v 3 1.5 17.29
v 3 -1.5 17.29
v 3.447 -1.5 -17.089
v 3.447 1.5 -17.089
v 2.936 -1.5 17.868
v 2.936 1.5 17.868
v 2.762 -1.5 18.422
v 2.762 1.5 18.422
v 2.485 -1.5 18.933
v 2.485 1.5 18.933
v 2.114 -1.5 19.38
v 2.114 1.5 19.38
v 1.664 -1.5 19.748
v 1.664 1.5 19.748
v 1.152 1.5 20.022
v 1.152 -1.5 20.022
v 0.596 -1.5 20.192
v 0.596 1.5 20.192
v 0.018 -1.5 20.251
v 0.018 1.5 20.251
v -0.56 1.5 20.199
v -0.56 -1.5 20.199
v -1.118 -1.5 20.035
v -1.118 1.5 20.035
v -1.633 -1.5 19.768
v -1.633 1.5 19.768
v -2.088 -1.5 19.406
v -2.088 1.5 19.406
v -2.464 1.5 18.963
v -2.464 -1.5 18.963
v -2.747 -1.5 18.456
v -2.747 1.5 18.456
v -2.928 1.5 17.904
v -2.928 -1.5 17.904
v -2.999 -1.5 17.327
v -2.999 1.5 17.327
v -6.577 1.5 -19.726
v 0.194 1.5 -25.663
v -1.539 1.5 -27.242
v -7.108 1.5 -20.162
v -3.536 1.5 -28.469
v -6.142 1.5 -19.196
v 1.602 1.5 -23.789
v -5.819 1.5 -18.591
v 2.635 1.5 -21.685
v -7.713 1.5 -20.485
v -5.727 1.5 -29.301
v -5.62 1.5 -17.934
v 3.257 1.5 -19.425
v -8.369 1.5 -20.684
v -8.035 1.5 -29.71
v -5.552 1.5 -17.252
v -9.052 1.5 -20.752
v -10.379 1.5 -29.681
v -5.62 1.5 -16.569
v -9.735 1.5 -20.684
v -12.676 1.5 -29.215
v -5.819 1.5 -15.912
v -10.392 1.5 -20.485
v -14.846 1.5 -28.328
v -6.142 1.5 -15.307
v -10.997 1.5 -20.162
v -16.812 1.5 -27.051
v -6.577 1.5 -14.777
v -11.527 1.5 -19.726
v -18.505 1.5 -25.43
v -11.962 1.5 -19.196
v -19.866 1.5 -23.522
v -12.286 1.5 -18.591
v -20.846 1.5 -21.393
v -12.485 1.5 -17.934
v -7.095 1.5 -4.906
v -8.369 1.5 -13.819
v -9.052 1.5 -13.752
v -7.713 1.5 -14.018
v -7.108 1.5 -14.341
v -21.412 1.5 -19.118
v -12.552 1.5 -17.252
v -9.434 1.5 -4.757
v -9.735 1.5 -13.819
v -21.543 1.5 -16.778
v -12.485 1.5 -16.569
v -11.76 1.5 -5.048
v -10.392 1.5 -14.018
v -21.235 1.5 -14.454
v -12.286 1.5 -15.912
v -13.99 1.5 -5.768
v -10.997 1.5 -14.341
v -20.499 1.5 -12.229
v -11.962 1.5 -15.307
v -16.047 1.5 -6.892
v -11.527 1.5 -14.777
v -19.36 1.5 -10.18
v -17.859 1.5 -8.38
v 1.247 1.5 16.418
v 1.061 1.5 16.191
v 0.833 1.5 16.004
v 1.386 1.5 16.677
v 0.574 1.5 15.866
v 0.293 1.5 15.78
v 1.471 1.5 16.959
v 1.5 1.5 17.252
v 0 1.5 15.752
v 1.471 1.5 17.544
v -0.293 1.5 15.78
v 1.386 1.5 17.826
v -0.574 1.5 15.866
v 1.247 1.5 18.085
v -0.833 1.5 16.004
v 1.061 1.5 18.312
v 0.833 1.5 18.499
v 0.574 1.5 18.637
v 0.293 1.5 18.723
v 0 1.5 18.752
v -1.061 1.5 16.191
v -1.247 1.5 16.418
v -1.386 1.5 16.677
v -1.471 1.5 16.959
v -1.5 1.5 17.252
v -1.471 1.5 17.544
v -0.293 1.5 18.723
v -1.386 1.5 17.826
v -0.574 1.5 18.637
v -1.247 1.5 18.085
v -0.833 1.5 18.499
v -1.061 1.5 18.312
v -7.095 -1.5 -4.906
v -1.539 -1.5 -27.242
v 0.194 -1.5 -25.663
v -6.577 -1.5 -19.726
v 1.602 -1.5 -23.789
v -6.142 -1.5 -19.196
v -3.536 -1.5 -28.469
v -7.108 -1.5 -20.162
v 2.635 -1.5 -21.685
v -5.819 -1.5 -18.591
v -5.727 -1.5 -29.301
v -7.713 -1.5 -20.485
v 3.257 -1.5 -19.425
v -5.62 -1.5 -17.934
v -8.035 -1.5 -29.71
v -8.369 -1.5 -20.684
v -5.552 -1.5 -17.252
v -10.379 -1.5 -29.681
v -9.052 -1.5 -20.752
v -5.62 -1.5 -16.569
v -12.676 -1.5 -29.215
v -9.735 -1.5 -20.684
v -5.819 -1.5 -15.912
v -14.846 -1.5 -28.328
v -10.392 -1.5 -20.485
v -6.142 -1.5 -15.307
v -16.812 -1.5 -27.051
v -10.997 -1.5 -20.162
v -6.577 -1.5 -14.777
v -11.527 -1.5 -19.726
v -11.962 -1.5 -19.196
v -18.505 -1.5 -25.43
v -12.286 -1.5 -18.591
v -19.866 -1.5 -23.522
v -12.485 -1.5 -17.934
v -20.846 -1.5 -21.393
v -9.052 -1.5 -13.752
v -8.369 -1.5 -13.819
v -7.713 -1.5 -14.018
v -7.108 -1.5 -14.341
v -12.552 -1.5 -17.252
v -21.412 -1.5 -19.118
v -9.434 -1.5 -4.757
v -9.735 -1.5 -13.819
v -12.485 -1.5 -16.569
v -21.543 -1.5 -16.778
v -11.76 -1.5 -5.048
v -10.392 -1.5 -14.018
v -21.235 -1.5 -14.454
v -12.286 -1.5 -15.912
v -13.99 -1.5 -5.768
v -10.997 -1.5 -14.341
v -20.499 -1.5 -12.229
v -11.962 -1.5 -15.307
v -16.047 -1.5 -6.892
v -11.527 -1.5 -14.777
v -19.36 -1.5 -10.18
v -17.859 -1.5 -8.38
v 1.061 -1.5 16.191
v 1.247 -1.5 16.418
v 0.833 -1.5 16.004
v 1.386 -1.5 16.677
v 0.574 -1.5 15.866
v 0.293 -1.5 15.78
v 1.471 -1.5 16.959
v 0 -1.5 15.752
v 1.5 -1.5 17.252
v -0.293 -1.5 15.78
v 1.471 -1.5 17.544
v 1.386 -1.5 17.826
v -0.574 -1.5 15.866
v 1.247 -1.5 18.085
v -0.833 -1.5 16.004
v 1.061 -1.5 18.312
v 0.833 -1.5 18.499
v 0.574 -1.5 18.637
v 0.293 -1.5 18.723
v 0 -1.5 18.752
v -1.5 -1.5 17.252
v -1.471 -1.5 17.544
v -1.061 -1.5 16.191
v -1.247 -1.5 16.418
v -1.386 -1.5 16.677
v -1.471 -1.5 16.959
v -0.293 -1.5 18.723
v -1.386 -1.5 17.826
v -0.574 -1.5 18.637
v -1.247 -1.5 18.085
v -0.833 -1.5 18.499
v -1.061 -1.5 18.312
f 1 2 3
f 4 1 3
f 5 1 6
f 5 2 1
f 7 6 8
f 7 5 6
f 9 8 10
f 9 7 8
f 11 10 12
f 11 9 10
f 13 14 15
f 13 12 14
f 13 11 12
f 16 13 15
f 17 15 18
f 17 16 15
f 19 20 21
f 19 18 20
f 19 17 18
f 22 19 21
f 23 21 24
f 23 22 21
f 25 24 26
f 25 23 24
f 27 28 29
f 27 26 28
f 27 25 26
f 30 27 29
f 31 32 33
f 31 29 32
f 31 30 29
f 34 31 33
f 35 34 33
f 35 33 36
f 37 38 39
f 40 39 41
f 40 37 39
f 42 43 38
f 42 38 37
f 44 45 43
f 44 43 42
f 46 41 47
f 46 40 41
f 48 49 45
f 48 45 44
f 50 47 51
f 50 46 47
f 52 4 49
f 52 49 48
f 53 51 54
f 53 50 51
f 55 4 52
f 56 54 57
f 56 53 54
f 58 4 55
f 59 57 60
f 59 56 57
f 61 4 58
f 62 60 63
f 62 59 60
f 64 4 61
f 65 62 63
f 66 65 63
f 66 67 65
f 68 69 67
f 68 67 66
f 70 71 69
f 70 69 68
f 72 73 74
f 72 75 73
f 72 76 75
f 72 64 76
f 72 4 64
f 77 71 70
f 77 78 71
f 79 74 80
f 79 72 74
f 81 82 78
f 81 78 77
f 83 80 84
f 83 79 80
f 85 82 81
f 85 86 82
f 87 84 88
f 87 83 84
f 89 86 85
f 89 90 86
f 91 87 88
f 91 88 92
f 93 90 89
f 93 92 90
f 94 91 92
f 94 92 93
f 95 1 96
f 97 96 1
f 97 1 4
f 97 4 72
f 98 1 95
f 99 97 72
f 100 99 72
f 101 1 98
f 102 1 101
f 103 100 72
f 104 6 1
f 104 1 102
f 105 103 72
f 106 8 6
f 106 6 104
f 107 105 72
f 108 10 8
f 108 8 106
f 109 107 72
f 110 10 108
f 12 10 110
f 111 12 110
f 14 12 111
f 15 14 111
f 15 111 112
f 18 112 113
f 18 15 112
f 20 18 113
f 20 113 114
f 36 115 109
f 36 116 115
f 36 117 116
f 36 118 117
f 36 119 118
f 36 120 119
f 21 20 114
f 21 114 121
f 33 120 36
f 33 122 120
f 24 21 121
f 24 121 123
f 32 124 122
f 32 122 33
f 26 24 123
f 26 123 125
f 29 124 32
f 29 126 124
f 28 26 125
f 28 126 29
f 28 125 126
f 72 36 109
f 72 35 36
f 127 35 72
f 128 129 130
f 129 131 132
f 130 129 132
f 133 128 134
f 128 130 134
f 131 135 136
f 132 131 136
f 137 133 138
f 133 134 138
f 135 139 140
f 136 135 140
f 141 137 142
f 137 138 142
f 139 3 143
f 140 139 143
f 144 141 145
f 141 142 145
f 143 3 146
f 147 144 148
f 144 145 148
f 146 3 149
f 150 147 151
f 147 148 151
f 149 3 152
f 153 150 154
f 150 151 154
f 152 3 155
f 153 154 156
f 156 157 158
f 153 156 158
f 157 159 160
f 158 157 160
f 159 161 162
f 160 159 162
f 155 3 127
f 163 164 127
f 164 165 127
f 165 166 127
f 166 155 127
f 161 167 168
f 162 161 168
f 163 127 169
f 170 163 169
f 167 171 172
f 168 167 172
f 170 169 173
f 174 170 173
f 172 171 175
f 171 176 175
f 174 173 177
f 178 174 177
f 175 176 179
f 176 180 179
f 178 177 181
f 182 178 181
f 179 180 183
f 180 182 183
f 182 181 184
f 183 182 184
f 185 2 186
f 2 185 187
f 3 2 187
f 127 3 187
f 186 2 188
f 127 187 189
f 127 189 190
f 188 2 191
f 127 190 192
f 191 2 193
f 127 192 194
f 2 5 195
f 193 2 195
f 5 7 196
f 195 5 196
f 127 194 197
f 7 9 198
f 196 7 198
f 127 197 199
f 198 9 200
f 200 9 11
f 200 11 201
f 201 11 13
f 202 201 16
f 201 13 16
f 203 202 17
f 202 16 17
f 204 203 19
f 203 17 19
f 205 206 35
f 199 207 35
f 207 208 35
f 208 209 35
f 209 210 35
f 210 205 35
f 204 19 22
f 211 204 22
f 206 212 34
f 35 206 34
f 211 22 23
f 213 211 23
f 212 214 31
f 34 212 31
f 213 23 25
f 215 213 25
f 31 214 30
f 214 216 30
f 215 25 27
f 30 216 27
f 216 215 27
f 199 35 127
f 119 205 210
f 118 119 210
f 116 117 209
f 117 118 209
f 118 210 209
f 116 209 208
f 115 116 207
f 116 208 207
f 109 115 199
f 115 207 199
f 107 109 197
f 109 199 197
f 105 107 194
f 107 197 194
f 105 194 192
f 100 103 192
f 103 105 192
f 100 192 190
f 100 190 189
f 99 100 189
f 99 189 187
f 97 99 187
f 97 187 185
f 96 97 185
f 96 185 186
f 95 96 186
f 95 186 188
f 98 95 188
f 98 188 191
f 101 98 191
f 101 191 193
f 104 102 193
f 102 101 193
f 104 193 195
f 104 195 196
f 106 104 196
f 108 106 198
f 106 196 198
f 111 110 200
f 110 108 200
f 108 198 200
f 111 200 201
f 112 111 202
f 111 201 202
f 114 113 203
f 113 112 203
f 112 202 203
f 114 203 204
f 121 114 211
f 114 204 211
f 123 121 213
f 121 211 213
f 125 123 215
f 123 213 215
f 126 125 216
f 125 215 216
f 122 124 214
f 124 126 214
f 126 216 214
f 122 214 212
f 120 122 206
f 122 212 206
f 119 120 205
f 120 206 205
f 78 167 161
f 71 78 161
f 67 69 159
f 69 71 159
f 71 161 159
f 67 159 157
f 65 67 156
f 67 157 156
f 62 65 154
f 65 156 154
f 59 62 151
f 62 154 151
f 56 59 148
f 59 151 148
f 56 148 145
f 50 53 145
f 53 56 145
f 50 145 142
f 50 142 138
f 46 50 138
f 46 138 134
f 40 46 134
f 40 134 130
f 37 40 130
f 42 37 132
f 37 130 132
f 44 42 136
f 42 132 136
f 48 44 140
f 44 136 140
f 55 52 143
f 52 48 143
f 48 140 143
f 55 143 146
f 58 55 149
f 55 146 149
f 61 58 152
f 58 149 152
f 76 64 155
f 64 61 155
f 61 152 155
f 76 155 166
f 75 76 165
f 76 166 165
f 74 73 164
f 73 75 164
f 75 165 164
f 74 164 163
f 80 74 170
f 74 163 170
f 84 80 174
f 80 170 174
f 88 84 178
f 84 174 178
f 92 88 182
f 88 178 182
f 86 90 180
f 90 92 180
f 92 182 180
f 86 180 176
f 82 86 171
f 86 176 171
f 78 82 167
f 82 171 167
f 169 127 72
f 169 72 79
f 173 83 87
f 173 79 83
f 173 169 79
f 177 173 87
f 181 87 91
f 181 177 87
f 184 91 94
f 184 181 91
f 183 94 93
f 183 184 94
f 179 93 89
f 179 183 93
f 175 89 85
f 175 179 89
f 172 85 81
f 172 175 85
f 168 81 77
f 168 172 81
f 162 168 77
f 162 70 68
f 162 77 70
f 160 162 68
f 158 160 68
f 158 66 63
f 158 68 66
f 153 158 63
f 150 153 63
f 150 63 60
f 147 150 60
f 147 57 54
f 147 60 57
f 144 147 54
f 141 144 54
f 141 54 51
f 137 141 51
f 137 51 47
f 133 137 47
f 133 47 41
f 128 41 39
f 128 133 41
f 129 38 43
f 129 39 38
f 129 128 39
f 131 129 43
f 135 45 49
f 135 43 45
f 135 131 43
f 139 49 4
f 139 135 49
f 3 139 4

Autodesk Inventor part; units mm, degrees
ref_plane "YZ Plane" through (0, 0, 0) normal (1, 0, 0) x (0, 1, 0)
ref_plane "XZ Plane" through (0, 0, 0) normal (0, 1, 0) x (-1, 0, 0)
ref_plane "XY Plane" through (0, 0, 0) normal (0, 0, 1) x (1, 0, 0)
sketch "Boceto1" plane through (0, 0, 0) normal (0, 1, 0) x (-1, 0, 0)
  line L0 (0, -17.2515) -> (0, 17.2515) construction
  line L1 (-2.9997, 17.2904) -> (-3.4466, -17.089)
  arc A0 (2.999, 17.3273) -> (-2.9997, 17.2904) centre (0, 17.2515) ccw
  circle A1 centre (0, 17.2515) radius 1.5
  arc A2 (-3.4466, -17.089) -> (7.0947, -4.9057) centre (9.0523, -17.2515) ccw
  line L2 (0, -17.2515) -> (12.8049, -17.2515) construction
  line L3 (2.999, 17.3273) -> (7.0947, -4.9057)
  circle A3 centre (9.0523, -17.2515) radius 3.5
  point P0 (0, 0)
  point P1 (9.3192, -29.7486)
  point P2 (-0.0184, 20.2514)
  dimension "d0" = 6
  dimension "d1" = 3
  dimension "d3" = 12.5
  dimension "d4" = 50
  dimension "d5" = 7
extrude "Extrusión1" add sketch "Boceto1" along normal mid plane 3
equation "\"Radio_pliegue\" = Grosor"
equation "\"Anchura_desahogo_plegado\" = Grosor"
equation "\"Profundidad_desahogo_plegado\" = 0.5 * Grosor"
equation "\"Tamaño_destalonado\" = 4 * Grosor"
equation "\"Remanente_mínimo\" = 2 * Grosor"
equation "\"Radiodetransición\" = Radio_pliegue"
equation "\"Tamaño_de_radio_de_Jacobi\" = Radio_pliegue"
equation "\"TamañoSeparación\" = Grosor"
equation "\"Grosor\" = 0.5"
properties part number "Pinza_pieza4"
